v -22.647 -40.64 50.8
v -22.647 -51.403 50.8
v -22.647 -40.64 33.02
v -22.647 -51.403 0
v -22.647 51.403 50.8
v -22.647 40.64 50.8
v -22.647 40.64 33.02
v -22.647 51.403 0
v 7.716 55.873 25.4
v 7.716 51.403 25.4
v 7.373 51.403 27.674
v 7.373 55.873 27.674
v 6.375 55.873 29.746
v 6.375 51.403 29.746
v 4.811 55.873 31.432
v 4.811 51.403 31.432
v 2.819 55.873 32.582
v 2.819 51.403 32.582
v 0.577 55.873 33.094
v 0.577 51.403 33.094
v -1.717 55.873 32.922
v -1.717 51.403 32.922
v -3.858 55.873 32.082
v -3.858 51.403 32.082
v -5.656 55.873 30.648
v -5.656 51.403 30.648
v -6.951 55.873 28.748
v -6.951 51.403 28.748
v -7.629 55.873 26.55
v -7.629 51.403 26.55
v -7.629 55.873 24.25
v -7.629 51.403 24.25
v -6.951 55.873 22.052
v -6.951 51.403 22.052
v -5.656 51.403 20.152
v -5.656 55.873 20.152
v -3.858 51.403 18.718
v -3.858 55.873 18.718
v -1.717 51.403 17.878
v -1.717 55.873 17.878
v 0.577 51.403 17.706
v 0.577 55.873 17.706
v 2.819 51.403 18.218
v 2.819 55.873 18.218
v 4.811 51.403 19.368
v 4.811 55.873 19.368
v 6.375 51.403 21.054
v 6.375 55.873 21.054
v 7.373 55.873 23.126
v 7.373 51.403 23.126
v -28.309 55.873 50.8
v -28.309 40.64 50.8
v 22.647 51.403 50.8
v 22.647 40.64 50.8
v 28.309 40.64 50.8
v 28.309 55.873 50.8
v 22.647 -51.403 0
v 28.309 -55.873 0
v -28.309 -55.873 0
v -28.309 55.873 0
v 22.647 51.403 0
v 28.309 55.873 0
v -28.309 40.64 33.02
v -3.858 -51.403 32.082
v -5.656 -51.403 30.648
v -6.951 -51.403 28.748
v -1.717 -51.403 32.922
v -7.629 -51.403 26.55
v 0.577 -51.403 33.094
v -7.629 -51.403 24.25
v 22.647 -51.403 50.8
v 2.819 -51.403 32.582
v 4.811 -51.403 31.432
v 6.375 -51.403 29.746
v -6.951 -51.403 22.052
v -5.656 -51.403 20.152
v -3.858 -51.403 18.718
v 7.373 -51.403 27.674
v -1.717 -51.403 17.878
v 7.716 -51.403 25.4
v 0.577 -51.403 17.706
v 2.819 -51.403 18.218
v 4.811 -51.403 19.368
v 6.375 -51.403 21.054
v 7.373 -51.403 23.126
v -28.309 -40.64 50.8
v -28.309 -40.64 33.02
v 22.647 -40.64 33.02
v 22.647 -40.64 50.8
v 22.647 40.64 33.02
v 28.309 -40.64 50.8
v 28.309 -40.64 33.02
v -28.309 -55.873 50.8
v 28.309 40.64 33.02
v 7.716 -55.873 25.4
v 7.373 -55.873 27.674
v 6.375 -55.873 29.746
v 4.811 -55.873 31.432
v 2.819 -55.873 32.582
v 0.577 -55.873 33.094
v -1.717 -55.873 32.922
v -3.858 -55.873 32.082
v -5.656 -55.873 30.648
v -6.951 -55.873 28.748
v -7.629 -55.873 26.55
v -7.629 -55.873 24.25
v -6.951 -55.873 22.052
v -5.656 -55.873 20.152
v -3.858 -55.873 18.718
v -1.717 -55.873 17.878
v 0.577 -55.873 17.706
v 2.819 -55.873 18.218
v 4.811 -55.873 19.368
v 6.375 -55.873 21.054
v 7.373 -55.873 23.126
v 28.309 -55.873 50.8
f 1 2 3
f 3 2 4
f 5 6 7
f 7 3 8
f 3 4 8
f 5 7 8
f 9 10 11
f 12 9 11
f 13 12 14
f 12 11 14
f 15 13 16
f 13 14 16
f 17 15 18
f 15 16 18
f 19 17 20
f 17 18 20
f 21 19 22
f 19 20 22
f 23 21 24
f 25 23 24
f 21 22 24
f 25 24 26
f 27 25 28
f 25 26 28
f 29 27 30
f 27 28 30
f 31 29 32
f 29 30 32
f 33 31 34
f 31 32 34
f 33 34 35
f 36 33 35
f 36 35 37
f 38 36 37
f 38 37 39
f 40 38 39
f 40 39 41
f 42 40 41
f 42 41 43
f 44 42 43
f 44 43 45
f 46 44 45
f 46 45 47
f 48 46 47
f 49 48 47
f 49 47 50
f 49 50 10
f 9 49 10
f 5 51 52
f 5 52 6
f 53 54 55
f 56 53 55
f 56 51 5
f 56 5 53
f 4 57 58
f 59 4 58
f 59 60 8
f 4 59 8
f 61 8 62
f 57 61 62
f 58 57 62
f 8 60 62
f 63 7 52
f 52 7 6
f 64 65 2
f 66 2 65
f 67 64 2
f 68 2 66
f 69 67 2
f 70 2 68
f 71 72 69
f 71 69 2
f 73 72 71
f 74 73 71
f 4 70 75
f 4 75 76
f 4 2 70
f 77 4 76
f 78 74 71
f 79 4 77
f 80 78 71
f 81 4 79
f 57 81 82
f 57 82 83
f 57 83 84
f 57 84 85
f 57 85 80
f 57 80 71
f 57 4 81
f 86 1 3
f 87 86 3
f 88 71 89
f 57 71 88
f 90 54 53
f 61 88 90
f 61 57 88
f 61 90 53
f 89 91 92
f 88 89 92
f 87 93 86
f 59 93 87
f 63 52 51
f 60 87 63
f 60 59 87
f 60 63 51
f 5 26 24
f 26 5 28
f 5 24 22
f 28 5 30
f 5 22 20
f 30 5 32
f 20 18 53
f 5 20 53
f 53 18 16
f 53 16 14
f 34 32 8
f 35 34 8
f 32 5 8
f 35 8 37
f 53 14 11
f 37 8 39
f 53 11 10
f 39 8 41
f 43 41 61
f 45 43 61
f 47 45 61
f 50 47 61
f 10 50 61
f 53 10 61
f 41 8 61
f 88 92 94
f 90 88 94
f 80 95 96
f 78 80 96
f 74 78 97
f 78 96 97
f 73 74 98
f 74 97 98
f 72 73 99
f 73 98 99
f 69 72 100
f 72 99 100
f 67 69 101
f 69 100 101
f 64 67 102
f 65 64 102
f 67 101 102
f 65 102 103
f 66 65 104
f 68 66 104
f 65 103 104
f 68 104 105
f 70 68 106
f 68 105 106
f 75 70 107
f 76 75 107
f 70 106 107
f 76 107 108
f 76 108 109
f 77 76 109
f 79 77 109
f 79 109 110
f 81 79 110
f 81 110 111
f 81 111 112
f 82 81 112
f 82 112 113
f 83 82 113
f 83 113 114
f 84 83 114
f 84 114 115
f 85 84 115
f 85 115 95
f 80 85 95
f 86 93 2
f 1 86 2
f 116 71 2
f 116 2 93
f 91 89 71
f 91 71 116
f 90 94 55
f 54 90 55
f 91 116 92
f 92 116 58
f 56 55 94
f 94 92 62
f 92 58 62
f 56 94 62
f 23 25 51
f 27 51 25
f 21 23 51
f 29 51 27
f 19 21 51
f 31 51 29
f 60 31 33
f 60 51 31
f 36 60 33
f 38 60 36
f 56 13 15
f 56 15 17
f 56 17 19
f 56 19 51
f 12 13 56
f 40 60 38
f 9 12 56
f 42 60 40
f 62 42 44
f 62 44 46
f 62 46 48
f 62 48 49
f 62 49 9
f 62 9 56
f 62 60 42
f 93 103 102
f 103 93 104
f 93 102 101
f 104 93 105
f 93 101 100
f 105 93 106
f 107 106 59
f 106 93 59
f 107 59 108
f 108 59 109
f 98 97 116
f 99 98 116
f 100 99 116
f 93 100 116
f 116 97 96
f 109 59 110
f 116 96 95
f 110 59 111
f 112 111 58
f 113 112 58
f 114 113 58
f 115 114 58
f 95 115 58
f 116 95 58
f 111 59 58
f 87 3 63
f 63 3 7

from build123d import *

# Parameters (mm, degrees)
F0_W     = 56.617882
F0_H     = 111.745812
F0_W_2   = 45.294308
F0_H_2   = 102.806144
F1_DEPTH = 50.8
F3_DEPTH = 76.2
F4_R     = 7.715563
F5_DEPTH = 127


with BuildPart() as f1:
    # F0 (on Top) → F1 (new body)
    with BuildSketch(Plane.XY):
        Rectangle(F0_W, F0_H)
        Rectangle(F0_W_2, F0_H_2, mode=Mode.SUBTRACT)
    extrude(amount=F1_DEPTH)

    # F2 (on face) → F3 (cut)
    with BuildSketch(Plane.YZ.offset(28.308941)):
        Polygon((40.64, 50.8), (0, 50.8), (-40.64, 50.8), (-40.64, 33.02), (40.64, 33.02), align=None)
    extrude(amount=-F3_DEPTH, mode=Mode.SUBTRACT)

    # F4 (on face) → F5 (cut)
    with BuildSketch(Plane.XZ.offset(55.872906)):
        with Locations((0, 25.4)):
            Circle(F4_R)
    extrude(amount=-F5_DEPTH, mode=Mode.SUBTRACT)


solid = f1.part
